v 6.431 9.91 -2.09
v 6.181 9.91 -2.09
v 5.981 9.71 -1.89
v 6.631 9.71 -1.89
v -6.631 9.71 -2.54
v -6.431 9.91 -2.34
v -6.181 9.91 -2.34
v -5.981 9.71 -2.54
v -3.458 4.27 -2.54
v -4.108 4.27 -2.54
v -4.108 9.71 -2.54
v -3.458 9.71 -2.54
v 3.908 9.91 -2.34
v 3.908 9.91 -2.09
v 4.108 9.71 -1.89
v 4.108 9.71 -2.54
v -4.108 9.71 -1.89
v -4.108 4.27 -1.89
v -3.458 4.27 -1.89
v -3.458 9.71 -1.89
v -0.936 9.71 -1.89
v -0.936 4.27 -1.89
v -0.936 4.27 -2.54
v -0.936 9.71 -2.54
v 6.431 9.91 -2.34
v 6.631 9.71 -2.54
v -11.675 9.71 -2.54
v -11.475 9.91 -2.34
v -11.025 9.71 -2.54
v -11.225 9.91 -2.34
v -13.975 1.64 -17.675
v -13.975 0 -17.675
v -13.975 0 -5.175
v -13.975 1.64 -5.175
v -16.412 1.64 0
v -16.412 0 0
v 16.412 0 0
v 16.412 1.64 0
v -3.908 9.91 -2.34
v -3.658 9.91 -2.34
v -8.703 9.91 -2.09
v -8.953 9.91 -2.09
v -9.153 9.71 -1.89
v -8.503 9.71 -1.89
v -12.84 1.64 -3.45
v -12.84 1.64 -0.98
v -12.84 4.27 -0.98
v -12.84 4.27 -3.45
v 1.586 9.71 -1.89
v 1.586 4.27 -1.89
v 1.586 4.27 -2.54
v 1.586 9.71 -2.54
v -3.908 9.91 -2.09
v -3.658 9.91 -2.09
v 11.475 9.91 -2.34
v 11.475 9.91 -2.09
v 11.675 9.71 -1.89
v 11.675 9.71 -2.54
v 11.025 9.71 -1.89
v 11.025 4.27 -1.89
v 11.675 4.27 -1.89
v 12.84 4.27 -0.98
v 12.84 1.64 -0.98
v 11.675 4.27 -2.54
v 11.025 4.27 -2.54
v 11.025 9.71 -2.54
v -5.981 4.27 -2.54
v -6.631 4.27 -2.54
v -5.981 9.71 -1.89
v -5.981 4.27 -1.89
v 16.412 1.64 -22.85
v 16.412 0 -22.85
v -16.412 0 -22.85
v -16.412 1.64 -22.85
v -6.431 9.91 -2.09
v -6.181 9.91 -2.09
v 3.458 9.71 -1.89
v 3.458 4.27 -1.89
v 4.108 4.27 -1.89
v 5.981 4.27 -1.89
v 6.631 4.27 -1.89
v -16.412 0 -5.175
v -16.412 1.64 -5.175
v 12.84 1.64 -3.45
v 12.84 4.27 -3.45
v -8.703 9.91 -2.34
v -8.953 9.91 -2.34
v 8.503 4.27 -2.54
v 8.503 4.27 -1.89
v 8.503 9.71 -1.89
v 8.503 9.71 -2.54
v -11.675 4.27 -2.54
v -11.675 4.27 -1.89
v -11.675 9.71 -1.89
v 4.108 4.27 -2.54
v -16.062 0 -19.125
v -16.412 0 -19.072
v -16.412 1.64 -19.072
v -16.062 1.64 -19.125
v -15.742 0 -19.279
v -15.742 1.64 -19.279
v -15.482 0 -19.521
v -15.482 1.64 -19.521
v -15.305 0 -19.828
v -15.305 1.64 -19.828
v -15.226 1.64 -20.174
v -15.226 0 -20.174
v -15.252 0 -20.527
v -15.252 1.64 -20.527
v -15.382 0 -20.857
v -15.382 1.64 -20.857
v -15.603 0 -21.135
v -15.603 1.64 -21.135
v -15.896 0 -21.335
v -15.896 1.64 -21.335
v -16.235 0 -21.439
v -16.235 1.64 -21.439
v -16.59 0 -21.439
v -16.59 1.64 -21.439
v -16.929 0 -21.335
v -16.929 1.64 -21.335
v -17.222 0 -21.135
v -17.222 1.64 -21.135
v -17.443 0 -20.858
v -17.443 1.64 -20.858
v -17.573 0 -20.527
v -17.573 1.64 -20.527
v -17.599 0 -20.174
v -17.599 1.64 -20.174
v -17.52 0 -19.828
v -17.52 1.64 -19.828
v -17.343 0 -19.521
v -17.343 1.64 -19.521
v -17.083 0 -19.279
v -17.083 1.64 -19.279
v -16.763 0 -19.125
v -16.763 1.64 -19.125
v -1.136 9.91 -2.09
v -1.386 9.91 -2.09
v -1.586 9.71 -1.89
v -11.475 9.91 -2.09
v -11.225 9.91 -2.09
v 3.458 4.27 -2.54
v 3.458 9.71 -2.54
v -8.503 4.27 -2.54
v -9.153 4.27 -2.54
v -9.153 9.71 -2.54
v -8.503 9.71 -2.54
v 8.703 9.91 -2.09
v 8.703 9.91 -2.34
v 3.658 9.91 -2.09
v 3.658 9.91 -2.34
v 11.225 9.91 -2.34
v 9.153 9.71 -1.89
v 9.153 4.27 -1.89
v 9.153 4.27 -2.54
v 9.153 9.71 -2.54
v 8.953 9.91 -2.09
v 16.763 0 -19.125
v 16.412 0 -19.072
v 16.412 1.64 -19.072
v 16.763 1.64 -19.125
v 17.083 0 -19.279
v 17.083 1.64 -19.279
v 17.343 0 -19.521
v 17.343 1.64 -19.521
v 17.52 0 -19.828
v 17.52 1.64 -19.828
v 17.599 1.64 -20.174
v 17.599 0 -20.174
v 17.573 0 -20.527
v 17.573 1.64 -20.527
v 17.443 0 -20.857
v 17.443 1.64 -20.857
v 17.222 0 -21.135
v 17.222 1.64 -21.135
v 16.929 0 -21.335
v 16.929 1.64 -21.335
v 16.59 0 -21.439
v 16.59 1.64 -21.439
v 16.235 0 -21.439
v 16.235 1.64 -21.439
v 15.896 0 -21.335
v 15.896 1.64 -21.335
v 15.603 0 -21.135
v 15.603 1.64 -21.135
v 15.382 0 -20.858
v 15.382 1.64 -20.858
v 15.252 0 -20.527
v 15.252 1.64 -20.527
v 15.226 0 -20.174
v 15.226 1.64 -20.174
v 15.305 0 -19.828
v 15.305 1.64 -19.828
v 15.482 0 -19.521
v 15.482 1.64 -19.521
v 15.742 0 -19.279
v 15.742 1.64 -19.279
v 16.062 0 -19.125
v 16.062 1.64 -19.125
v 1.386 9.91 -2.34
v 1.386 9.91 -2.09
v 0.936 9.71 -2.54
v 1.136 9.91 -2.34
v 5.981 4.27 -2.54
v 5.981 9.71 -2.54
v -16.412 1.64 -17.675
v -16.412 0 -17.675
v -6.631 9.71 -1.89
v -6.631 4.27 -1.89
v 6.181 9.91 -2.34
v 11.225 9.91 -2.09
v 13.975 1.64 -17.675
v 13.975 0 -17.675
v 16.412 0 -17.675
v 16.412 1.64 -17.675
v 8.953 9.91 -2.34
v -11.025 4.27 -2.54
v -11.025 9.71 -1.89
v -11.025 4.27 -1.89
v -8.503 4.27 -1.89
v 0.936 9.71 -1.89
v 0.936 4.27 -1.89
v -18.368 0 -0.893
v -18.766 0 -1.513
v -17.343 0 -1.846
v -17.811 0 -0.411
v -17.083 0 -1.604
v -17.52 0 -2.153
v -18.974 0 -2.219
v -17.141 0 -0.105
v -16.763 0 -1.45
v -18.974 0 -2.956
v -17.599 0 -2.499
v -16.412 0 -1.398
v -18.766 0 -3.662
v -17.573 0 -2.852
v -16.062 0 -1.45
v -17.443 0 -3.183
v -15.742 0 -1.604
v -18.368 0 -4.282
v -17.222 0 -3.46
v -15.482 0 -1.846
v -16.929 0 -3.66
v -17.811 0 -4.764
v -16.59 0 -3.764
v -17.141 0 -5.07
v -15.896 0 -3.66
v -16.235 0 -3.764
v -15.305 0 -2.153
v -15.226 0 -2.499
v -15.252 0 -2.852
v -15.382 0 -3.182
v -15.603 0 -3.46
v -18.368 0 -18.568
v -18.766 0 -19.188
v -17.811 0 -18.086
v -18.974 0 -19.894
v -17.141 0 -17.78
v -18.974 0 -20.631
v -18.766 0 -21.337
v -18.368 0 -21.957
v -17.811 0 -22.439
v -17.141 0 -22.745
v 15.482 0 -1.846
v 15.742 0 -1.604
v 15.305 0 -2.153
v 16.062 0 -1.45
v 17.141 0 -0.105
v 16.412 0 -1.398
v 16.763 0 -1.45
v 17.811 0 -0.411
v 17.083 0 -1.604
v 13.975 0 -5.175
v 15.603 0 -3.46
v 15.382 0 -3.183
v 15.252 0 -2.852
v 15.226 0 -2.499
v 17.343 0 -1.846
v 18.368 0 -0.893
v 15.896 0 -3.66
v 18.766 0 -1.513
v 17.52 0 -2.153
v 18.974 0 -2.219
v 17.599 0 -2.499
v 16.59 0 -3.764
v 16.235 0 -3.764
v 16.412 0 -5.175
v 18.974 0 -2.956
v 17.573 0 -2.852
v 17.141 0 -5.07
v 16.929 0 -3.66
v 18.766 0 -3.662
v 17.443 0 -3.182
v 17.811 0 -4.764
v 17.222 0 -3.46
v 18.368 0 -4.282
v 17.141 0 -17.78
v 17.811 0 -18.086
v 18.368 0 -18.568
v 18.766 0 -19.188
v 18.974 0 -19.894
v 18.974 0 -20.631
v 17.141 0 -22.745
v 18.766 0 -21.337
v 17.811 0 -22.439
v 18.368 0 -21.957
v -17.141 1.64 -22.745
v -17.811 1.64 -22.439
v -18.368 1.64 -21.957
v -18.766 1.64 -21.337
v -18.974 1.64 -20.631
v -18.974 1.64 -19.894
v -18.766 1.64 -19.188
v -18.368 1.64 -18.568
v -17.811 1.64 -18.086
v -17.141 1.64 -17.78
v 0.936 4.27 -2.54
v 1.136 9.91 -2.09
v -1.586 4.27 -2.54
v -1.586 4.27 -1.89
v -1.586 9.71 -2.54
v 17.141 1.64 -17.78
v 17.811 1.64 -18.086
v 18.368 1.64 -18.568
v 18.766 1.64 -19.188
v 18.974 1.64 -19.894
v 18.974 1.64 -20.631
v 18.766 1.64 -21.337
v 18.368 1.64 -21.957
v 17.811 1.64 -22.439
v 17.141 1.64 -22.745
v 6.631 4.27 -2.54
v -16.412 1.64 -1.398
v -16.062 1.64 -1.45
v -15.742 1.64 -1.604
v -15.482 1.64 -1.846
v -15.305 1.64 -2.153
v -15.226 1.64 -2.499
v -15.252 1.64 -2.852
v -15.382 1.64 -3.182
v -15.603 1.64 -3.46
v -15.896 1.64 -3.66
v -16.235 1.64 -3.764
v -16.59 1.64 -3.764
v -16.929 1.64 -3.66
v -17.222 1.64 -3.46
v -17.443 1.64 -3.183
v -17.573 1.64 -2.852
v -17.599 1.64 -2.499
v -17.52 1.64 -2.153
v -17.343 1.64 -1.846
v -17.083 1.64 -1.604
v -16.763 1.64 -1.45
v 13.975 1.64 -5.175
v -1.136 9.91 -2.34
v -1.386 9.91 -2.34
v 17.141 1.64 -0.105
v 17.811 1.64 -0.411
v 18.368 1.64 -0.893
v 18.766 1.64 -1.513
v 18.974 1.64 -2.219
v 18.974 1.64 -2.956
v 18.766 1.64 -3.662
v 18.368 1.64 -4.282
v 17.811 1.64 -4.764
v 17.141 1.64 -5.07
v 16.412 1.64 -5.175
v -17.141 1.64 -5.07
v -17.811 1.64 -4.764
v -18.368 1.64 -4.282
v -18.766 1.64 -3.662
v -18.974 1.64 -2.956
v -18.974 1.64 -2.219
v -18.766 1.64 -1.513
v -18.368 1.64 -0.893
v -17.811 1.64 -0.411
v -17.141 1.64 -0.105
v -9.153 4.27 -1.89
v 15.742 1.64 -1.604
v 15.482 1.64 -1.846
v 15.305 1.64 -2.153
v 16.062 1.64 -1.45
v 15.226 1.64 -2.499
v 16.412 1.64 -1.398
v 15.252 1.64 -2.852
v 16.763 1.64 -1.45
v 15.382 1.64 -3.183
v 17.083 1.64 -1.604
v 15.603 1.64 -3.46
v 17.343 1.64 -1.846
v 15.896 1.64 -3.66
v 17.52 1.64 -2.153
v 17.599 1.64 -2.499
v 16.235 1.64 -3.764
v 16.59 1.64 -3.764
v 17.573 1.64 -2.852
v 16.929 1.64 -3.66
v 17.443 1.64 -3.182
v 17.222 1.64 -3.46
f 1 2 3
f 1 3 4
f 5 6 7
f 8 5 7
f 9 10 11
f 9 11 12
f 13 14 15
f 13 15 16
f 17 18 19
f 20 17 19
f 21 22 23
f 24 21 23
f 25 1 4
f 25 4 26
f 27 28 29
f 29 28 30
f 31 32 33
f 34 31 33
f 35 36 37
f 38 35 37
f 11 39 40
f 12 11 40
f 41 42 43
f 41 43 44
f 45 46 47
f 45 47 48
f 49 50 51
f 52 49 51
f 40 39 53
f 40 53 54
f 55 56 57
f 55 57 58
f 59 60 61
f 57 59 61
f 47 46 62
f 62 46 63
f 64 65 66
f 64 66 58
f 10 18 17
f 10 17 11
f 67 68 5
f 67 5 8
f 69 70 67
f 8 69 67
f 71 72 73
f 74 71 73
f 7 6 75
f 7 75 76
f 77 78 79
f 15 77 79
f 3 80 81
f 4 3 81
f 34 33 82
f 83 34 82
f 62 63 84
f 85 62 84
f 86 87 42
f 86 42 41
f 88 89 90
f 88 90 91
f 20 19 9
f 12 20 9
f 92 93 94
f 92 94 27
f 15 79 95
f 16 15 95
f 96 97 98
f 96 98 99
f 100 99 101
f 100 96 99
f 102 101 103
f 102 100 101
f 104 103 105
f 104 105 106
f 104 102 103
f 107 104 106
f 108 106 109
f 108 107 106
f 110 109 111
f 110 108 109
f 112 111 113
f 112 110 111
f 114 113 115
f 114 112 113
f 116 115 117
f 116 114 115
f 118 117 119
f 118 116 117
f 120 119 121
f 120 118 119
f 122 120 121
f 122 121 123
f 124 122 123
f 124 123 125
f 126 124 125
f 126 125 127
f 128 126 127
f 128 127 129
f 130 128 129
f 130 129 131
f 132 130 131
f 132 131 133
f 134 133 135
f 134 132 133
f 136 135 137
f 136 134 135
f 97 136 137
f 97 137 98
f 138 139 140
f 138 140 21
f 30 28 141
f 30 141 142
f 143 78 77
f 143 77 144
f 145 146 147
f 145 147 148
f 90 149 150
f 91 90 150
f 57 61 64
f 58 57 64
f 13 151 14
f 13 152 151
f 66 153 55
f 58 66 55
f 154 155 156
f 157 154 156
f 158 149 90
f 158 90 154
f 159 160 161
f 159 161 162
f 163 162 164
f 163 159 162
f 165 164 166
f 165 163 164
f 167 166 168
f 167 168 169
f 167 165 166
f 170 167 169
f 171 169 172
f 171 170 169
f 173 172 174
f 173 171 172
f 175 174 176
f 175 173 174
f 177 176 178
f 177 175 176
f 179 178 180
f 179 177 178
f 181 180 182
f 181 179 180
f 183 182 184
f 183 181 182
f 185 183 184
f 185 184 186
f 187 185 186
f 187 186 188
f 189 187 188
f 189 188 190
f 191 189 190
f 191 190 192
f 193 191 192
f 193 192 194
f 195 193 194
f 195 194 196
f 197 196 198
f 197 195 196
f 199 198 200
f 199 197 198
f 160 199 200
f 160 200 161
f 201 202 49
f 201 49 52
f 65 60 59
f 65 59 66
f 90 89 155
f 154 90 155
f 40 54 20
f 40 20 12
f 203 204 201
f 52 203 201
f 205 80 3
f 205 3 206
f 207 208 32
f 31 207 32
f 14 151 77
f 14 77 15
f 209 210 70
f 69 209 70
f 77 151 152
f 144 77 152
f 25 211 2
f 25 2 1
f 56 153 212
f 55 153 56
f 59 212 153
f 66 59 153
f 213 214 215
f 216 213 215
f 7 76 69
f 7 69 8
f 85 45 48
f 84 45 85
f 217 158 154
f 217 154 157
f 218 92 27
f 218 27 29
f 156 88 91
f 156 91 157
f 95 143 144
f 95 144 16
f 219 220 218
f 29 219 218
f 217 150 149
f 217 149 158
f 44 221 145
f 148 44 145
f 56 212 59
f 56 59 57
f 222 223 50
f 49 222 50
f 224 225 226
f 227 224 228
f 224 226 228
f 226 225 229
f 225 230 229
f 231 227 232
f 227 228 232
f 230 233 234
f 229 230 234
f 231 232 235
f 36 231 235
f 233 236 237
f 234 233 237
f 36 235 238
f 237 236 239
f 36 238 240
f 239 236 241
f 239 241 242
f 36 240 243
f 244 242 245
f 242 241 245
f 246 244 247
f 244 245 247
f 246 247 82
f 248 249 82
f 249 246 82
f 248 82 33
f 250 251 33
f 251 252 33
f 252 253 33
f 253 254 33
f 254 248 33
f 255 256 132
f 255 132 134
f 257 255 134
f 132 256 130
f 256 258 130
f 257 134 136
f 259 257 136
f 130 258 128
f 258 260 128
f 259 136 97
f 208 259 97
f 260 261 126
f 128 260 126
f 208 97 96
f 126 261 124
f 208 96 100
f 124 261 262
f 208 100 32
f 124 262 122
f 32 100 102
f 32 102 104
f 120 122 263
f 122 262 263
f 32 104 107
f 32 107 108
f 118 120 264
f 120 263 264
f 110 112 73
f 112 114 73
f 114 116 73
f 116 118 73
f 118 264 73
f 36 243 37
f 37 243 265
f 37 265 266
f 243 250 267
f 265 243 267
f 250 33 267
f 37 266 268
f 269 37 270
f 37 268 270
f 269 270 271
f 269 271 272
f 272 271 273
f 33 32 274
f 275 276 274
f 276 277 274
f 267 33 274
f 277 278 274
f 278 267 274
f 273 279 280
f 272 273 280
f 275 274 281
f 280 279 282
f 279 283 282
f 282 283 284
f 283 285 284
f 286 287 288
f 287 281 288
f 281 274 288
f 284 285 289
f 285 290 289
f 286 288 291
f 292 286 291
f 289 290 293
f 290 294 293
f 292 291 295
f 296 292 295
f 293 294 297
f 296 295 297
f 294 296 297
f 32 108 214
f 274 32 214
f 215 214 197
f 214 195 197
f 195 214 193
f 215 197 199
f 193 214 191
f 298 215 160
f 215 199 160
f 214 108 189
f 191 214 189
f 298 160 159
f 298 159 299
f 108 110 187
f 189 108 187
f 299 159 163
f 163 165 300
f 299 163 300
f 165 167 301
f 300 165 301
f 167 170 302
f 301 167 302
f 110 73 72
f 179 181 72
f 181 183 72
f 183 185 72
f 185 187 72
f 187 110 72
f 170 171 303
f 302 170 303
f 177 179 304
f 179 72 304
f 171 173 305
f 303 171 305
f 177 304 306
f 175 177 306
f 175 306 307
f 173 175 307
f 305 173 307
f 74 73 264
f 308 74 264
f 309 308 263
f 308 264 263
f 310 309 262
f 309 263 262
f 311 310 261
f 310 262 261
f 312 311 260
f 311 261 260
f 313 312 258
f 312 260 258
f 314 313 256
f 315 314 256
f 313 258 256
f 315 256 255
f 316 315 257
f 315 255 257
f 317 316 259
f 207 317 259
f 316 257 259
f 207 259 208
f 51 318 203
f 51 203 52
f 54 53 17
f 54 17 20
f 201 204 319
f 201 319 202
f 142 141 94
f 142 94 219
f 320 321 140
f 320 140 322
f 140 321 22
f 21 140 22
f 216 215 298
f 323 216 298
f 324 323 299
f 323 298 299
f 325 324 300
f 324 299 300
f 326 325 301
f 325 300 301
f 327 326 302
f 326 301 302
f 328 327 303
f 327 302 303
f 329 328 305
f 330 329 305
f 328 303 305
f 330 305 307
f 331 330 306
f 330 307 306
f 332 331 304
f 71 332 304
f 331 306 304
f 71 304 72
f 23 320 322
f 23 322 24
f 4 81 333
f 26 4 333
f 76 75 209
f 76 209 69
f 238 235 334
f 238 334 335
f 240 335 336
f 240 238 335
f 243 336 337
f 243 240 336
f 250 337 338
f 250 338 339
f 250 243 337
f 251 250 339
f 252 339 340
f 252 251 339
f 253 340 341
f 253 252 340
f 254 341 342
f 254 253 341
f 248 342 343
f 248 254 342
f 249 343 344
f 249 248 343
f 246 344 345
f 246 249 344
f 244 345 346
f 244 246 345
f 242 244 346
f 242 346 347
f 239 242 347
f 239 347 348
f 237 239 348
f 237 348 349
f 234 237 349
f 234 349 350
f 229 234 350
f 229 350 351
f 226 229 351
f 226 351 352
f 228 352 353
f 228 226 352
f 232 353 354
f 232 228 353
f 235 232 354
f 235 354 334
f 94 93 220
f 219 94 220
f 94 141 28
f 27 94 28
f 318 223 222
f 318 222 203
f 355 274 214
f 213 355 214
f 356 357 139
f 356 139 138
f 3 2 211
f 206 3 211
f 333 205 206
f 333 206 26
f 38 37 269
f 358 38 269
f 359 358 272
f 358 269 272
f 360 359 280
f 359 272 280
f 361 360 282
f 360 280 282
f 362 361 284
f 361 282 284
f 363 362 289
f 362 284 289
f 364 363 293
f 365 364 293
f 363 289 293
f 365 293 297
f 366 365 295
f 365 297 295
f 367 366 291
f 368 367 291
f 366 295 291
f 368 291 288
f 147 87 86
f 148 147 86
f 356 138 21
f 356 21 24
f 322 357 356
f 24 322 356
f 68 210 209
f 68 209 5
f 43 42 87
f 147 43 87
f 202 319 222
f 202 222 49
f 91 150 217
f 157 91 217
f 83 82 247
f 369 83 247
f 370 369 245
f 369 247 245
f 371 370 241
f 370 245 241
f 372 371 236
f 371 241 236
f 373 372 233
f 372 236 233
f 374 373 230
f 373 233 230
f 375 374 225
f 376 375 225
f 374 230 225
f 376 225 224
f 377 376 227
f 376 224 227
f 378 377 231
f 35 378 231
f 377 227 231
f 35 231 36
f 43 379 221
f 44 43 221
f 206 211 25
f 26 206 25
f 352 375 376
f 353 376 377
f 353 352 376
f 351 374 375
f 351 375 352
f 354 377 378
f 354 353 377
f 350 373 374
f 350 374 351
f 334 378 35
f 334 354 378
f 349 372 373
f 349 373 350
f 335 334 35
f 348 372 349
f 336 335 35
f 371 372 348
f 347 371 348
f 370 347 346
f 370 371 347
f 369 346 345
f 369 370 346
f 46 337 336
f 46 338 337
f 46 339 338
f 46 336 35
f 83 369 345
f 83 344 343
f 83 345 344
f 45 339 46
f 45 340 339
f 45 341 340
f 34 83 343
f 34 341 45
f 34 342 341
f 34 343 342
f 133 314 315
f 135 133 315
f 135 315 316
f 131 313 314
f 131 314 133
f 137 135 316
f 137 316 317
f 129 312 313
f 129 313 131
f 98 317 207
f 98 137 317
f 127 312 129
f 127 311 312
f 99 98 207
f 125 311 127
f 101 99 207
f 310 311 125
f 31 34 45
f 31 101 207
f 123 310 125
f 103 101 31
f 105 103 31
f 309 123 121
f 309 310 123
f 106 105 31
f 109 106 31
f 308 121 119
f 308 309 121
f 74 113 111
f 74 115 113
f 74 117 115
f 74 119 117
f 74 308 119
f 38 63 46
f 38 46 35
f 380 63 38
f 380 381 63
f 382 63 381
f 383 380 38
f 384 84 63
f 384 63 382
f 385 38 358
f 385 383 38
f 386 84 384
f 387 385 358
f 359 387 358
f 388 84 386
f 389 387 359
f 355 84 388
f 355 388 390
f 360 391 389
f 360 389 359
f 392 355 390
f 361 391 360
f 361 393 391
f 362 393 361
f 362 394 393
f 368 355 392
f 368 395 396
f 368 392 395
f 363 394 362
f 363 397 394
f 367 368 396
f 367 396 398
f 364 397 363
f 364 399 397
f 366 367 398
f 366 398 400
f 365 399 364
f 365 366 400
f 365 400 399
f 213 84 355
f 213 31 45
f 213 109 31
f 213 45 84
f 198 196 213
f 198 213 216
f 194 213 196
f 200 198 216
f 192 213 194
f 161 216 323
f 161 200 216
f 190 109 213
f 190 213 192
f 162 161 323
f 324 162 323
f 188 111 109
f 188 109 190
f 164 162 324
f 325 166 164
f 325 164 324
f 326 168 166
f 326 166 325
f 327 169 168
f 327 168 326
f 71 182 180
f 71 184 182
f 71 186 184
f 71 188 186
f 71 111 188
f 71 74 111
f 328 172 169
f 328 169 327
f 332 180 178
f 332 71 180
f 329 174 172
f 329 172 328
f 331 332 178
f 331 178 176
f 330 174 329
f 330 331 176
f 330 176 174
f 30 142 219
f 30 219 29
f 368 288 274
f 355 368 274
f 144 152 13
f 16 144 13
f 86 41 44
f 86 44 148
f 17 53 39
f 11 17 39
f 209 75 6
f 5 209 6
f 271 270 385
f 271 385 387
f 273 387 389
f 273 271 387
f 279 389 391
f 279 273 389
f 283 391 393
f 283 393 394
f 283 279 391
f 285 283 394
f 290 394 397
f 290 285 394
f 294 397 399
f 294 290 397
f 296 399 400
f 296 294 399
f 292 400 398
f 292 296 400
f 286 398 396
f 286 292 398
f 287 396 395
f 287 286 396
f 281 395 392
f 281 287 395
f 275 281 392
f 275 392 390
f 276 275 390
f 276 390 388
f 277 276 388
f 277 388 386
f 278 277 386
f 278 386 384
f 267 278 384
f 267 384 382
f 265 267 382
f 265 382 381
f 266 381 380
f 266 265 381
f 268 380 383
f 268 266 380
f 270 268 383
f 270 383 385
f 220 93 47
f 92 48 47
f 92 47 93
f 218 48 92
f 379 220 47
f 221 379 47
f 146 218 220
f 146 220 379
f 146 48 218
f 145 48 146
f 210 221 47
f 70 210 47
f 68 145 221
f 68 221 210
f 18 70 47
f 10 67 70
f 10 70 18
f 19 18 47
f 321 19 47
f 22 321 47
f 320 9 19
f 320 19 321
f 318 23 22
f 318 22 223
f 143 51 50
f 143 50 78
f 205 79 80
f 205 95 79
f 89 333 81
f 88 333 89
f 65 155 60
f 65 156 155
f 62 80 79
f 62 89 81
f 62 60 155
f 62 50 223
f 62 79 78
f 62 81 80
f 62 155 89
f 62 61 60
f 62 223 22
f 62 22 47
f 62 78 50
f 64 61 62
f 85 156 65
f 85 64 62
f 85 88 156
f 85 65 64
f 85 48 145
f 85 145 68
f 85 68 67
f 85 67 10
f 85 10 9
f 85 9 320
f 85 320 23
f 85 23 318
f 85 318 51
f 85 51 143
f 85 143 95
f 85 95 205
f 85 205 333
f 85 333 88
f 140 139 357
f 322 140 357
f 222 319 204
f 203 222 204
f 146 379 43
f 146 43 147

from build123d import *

# Parameters (mm, degrees)
SKETCH1_R           = 1.19
BOSS_EXTRUDE1_DEPTH = 1.64
SKETCH2_W           = 25.68
SKETCH2_H           = 2.47
BOSS_EXTRUDE2_DEPTH = 2.63
SKETCH3_W           = 0.65
SKETCH3_H           = 0.65
BOSS_EXTRUDE3_DEPTH = 5.64
CHAMFER1_SIZE       = 0.2


with BuildPart() as part:
    # Sketch1 → Boss-Extrude1 (new body)
    with BuildSketch(Plane(origin=(0, 0, 0), x_dir=(1, 0, 0), z_dir=(0, 1, 0))):
        with BuildLine():
            Line((-16.4125, 0), (16.4125, 0))
            ThreePointArc((16.4125, 0), (19, 2.5875), (16.4125, 5.175))
            Line((16.4125, 5.175), (13.975, 5.175))
            Line((13.975, 5.175), (13.975, 17.675))
            Line((13.975, 17.675), (16.4125, 17.675))
            ThreePointArc((16.4125, 17.675), (19, 20.2625), (16.4125, 22.85))
            Line((16.4125, 22.85), (-16.4125, 22.85))
            ThreePointArc((-16.4125, 22.85), (-19, 20.2625), (-16.4125, 17.675))
            Line((-16.4125, 17.675), (-13.975, 17.675))
            Line((-13.975, 17.675), (-13.975, 5.175))
            Line((-13.975, 5.175), (-16.4125, 5.175))
            ThreePointArc((-16.4125, 5.175), (-19, 2.5875), (-16.4125, 0))
        make_face()
        with Locations(Location((16.4125, 20.2625, 0), (0, 0, 270))):
            Circle(SKETCH1_R, mode=Mode.SUBTRACT)
        with Locations(Location((-16.4125, 20.2625, 0), (0, 0, 270))):
            Circle(SKETCH1_R, mode=Mode.SUBTRACT)
        with Locations(Location((-16.4125, 2.5875, 0), (0, 0, 270))):
            Circle(SKETCH1_R, mode=Mode.SUBTRACT)
        with Locations(Location((16.4125, 2.5875, 0), (0, 0, 270))):
            Circle(SKETCH1_R, mode=Mode.SUBTRACT)
    extrude(amount=BOSS_EXTRUDE1_DEPTH)

    # Sketch2 → Boss-Extrude2 (add)
    with BuildSketch(Plane(origin=(0, 1.64, 0), x_dir=(1, 0, 0), z_dir=(0, 1, 0))):
        with Locations((0, 2.215)):
            Rectangle(SKETCH2_W, SKETCH2_H)
    extrude(amount=BOSS_EXTRUDE2_DEPTH)

    # Sketch3 → Boss-Extrude3 (add)
    with BuildSketch(Plane(origin=(0, 4.27, 0), x_dir=(1, 0, 0), z_dir=(0, 1, 0))):
        with Locations((11.35, 2.215)):
            Rectangle(SKETCH3_W, SKETCH3_H)
        with Locations((8.827777778, 2.215)):
            Rectangle(SKETCH3_W, SKETCH3_H)
        with Locations((6.305555556, 2.215)):
            Rectangle(SKETCH3_W, SKETCH3_H)
        with Locations((3.783333333, 2.215)):
            Rectangle(SKETCH3_W, SKETCH3_H)
        with Locations((1.261111111, 2.215)):
            Rectangle(SKETCH3_W, SKETCH3_H)
        with Locations((-1.261111111, 2.215)):
            Rectangle(SKETCH3_W, SKETCH3_H)
        with Locations((-3.783333333, 2.215)):
            Rectangle(SKETCH3_W, SKETCH3_H)
        with Locations((-6.305555556, 2.215)):
            Rectangle(SKETCH3_W, SKETCH3_H)
        with Locations((-8.827777778, 2.215)):
            Rectangle(SKETCH3_W, SKETCH3_H)
        with Locations((-11.35, 2.215)):
            Rectangle(SKETCH3_W, SKETCH3_H)
    extrude(amount=BOSS_EXTRUDE3_DEPTH)

    # Chamfer1
    chamfer1_edges = [part.edges().sort_by_distance(p)[0] for p in [
        (3.783333333, 9.91, -1.89),
        (4.108333333, 9.91, -2.215),
        (1.261111111, 9.91, -2.54),
        (0.936111111, 9.91, -2.215),
        (1.261111111, 9.91, -1.89),
        (1.586111111, 9.91, -2.215),
        (-1.261111111, 9.91, -2.54),
        (-1.586111111, 9.91, -2.215),
        (-1.261111111, 9.91, -1.89),
        (-0.936111111, 9.91, -2.215),
        (-3.783333333, 9.91, -2.54),
        (-4.108333333, 9.91, -2.215),
        (-3.783333333, 9.91, -1.89),
        (-3.458333333, 9.91, -2.215),
        (-6.305555556, 9.91, -2.54),
        (-6.630555556, 9.91, -2.215),
        (-6.305555556, 9.91, -1.89),
        (-5.980555556, 9.91, -2.215),
        (-8.827777778, 9.91, -2.54),
        (-9.152777778, 9.91, -2.215),
        (-8.827777778, 9.91, -1.89),
        (-8.502777778, 9.91, -2.215),
        (-11.35, 9.91, -2.54),
        (-11.675, 9.91, -2.215),
        (-11.35, 9.91, -1.89),
        (-11.025, 9.91, -2.215),
        (11.675, 9.91, -2.215),
        (11.35, 9.91, -2.54),
        (11.025, 9.91, -2.215),
        (11.35, 9.91, -1.89),
        (8.827777778, 9.91, -2.54),
        (8.502777778, 9.91, -2.215),
        (8.827777778, 9.91, -1.89),
        (9.152777778, 9.91, -2.215),
        (6.305555556, 9.91, -2.54),
        (5.980555556, 9.91, -2.215),
        (6.305555556, 9.91, -1.89),
        (6.630555556, 9.91, -2.215),
        (3.783333333, 9.91, -2.54),
        (3.458333333, 9.91, -2.215),
    ]]
    chamfer(chamfer1_edges, length=CHAMFER1_SIZE)


solid = part.part
